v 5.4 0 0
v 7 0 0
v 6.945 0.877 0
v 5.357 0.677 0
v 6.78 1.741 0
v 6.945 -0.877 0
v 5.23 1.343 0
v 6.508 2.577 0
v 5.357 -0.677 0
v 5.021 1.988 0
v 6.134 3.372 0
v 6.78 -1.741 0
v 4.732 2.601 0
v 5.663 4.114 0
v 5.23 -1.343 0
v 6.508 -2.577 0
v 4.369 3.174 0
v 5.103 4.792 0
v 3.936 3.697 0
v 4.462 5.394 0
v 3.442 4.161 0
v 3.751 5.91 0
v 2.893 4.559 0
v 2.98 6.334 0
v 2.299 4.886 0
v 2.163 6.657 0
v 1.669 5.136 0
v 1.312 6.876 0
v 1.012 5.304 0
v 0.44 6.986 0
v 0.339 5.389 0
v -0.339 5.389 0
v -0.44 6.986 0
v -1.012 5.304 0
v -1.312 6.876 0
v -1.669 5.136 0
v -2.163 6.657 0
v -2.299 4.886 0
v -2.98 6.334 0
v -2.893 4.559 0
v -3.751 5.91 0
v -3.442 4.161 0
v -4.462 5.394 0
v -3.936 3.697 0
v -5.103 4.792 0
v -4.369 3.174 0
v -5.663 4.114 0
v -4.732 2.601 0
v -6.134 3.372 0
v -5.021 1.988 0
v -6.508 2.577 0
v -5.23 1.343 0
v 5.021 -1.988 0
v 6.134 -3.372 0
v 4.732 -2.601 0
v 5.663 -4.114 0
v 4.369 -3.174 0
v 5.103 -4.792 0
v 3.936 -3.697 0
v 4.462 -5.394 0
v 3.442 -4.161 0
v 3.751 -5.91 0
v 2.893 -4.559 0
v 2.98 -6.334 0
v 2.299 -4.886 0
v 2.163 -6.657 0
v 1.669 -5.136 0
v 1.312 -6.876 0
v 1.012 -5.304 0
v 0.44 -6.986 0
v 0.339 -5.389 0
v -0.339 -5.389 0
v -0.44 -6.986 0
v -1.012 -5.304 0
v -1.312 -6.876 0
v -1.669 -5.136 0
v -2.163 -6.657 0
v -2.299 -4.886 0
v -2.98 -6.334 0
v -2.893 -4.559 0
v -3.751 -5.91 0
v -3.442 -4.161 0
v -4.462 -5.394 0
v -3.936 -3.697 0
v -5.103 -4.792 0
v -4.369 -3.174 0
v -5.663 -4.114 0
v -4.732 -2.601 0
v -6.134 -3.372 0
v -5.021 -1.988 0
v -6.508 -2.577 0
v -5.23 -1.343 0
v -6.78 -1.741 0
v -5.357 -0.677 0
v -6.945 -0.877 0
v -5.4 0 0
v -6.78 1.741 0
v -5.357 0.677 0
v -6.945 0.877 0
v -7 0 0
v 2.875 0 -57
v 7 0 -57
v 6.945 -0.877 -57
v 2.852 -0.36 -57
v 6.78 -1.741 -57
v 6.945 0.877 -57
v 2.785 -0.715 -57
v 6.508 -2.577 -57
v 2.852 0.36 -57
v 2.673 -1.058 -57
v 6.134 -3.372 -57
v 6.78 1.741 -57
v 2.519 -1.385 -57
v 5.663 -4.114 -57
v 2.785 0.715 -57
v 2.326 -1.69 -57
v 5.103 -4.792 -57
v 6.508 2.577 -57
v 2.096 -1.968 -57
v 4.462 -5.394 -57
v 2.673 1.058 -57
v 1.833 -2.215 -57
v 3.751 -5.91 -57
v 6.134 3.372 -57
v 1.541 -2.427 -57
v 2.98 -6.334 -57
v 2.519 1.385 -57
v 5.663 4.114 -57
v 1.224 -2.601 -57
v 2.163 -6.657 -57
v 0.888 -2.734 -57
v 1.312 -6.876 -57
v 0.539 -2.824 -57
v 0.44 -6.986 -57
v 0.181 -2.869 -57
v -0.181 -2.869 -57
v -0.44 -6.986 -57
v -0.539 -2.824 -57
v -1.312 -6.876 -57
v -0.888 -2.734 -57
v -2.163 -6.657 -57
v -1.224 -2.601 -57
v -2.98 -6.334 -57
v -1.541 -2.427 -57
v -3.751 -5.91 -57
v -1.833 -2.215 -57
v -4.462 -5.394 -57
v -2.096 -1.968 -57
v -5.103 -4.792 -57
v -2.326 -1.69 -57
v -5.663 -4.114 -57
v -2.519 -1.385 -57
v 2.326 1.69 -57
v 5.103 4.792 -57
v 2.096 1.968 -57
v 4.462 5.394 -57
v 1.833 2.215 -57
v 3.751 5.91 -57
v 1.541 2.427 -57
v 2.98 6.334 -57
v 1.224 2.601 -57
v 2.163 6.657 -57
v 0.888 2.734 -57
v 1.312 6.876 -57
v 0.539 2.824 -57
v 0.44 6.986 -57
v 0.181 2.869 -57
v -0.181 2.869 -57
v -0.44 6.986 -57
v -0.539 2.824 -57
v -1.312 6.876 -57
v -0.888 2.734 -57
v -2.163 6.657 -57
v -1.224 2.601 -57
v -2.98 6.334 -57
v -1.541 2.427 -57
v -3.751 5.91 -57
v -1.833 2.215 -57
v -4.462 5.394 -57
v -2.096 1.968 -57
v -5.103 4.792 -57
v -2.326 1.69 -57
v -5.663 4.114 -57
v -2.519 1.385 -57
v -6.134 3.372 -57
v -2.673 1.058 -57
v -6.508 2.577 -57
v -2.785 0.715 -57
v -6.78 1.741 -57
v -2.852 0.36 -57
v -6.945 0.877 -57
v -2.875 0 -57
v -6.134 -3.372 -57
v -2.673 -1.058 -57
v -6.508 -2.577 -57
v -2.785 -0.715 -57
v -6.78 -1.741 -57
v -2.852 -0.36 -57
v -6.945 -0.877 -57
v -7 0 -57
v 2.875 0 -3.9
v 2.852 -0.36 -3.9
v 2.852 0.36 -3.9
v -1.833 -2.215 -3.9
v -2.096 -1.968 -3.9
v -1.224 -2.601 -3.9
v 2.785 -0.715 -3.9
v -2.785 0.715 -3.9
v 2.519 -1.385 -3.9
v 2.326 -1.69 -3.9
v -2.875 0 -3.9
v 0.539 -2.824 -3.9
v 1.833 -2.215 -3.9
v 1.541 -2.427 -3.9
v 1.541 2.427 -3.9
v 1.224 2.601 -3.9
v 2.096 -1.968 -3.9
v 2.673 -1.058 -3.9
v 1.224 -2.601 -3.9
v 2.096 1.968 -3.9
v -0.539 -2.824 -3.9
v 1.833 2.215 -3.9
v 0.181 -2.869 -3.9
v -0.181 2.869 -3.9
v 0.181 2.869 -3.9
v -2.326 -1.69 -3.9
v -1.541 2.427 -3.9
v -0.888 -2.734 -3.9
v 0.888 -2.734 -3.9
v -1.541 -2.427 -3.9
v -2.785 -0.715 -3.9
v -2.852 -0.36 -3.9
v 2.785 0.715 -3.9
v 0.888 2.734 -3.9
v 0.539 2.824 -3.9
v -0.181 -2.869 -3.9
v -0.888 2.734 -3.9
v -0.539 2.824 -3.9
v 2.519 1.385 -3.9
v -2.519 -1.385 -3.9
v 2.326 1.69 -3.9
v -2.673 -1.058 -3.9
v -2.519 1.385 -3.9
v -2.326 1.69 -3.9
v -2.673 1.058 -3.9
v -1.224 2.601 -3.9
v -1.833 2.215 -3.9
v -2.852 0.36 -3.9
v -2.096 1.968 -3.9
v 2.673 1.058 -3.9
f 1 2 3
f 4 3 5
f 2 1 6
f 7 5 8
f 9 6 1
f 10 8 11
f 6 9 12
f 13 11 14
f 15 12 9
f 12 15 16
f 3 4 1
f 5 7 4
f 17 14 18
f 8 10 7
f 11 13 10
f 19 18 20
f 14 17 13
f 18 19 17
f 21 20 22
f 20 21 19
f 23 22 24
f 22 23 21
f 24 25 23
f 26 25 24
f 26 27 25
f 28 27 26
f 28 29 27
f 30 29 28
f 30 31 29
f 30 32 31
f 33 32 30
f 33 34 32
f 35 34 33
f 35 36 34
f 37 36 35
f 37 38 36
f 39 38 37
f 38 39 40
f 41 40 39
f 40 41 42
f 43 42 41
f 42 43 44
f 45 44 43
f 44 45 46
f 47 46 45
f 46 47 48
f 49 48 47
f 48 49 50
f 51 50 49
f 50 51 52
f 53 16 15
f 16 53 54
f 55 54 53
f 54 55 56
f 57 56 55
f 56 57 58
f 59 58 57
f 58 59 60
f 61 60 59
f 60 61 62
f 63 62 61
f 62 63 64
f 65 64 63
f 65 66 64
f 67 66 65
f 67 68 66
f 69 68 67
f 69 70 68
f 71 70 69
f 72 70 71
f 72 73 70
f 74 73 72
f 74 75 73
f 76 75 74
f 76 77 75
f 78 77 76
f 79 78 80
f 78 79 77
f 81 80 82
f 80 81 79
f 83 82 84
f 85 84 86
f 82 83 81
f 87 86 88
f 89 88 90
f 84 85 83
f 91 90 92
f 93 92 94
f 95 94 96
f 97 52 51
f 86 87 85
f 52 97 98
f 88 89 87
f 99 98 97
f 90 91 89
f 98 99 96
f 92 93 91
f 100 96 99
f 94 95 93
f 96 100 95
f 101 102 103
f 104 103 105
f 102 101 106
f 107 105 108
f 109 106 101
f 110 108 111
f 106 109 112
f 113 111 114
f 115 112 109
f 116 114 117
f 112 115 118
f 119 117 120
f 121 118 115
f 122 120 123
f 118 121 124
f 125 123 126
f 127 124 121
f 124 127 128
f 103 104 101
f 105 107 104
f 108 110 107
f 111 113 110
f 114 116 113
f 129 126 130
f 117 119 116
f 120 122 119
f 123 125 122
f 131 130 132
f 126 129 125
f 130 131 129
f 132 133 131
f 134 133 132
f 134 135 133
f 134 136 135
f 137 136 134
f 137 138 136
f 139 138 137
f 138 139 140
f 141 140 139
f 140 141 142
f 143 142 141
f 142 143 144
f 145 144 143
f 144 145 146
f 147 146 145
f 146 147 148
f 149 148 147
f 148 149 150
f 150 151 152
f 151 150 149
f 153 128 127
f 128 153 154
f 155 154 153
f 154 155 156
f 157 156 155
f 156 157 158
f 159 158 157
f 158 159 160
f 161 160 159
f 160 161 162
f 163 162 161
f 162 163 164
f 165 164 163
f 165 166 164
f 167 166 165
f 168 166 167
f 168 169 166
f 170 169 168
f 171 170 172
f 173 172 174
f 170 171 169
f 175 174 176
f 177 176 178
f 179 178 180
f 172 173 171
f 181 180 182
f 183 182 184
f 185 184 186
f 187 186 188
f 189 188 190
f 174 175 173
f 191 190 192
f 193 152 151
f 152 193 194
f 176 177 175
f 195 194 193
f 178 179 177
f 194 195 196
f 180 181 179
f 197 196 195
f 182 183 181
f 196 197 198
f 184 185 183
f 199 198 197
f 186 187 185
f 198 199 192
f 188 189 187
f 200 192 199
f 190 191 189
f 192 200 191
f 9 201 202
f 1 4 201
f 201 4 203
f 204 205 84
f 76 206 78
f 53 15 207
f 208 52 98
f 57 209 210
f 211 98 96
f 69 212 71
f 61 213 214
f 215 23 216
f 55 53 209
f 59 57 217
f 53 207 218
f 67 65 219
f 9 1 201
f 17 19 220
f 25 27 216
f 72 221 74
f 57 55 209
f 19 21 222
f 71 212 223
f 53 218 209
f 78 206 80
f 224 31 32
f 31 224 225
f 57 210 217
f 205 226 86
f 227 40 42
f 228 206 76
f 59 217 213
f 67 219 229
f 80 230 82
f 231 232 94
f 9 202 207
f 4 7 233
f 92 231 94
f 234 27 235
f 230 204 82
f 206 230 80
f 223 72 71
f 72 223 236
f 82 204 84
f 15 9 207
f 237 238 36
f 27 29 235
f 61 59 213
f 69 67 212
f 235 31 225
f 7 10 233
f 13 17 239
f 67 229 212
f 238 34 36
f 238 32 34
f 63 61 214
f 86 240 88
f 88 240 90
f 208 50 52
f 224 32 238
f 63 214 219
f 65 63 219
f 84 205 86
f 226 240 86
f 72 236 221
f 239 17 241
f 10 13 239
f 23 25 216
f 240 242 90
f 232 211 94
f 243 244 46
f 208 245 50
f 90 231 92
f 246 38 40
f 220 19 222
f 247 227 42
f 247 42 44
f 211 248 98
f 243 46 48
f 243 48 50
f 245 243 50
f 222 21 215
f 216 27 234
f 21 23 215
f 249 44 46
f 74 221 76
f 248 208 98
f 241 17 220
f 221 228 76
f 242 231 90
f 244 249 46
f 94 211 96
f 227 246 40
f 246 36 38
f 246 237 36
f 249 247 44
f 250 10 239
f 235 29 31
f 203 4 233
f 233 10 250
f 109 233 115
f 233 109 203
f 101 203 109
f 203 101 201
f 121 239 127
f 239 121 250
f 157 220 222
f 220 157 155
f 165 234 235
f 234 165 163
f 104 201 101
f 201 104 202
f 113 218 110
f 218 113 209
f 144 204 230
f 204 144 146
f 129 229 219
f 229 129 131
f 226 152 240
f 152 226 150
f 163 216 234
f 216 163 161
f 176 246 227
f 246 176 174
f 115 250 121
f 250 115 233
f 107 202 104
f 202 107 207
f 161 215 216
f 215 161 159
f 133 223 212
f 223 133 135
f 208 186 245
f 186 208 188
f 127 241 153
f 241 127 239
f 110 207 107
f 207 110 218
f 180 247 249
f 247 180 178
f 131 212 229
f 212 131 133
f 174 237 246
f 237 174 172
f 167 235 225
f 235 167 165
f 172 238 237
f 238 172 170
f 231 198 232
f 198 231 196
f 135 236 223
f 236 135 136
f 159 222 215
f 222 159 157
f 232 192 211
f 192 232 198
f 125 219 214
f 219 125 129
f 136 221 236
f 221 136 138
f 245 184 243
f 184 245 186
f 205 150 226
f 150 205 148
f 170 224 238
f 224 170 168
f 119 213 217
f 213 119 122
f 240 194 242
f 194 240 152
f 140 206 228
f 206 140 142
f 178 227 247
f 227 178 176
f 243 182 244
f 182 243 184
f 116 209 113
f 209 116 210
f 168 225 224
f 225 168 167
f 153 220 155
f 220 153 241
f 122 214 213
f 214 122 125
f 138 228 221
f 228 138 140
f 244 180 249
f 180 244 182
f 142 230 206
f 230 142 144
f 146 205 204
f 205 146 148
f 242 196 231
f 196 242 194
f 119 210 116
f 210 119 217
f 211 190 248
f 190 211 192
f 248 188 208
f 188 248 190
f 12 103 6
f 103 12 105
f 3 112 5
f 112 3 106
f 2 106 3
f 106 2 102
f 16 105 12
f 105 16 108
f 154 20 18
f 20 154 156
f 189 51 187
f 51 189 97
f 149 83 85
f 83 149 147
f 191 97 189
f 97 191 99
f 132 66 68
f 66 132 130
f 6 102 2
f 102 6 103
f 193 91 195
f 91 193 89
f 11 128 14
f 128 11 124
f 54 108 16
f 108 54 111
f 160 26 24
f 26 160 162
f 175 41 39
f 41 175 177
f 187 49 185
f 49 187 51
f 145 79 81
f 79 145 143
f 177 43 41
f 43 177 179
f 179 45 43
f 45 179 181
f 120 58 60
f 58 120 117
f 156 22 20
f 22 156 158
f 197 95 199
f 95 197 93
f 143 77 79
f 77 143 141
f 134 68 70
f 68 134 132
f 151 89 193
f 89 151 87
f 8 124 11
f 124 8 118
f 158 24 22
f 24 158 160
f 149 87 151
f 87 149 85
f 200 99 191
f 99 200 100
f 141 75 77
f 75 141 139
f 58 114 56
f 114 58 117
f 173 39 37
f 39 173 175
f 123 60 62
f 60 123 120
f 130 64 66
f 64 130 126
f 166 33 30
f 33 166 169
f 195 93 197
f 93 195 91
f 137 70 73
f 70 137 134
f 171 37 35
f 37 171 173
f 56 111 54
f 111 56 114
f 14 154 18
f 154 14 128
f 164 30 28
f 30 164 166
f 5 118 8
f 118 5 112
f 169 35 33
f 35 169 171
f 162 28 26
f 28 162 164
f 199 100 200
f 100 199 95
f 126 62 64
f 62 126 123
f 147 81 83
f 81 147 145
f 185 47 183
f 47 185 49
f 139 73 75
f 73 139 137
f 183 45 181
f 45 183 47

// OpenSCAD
$fn = 50;


difference() {
	union() {
		translate(v = [0, 0, -57.0000000000]) {
			cylinder(h = 57, r = 7.0000000000);
		}
		cylinder(h = 0, r = 16.0000000000);
	}
	union() {
		translate(v = [0, 0, 0]) {
			rotate(a = [0, 0, 0]) {
				difference() {
					union() {
						#translate(v = [0, 0, -57.0000000000]) {
							cylinder(h = 57, r = 2.6000000000);
						}
						#translate(v = [0, 0, -3.9000000000]) {
							cylinder(h = 3.9000000000, r = 7.0000000000, r1 = 2.8750000000, r2 = 5.4000000000);
						}
						#translate(v = [0, 0, -57.0000000000]) {
							cylinder(h = 57, r = 2.8750000000);
						}
						#translate(v = [0, 0, -57.0000000000]) {
							cylinder(h = 57, r = 2.6000000000);
						}
					}
					union();
				}
			}
		}
	}
}
